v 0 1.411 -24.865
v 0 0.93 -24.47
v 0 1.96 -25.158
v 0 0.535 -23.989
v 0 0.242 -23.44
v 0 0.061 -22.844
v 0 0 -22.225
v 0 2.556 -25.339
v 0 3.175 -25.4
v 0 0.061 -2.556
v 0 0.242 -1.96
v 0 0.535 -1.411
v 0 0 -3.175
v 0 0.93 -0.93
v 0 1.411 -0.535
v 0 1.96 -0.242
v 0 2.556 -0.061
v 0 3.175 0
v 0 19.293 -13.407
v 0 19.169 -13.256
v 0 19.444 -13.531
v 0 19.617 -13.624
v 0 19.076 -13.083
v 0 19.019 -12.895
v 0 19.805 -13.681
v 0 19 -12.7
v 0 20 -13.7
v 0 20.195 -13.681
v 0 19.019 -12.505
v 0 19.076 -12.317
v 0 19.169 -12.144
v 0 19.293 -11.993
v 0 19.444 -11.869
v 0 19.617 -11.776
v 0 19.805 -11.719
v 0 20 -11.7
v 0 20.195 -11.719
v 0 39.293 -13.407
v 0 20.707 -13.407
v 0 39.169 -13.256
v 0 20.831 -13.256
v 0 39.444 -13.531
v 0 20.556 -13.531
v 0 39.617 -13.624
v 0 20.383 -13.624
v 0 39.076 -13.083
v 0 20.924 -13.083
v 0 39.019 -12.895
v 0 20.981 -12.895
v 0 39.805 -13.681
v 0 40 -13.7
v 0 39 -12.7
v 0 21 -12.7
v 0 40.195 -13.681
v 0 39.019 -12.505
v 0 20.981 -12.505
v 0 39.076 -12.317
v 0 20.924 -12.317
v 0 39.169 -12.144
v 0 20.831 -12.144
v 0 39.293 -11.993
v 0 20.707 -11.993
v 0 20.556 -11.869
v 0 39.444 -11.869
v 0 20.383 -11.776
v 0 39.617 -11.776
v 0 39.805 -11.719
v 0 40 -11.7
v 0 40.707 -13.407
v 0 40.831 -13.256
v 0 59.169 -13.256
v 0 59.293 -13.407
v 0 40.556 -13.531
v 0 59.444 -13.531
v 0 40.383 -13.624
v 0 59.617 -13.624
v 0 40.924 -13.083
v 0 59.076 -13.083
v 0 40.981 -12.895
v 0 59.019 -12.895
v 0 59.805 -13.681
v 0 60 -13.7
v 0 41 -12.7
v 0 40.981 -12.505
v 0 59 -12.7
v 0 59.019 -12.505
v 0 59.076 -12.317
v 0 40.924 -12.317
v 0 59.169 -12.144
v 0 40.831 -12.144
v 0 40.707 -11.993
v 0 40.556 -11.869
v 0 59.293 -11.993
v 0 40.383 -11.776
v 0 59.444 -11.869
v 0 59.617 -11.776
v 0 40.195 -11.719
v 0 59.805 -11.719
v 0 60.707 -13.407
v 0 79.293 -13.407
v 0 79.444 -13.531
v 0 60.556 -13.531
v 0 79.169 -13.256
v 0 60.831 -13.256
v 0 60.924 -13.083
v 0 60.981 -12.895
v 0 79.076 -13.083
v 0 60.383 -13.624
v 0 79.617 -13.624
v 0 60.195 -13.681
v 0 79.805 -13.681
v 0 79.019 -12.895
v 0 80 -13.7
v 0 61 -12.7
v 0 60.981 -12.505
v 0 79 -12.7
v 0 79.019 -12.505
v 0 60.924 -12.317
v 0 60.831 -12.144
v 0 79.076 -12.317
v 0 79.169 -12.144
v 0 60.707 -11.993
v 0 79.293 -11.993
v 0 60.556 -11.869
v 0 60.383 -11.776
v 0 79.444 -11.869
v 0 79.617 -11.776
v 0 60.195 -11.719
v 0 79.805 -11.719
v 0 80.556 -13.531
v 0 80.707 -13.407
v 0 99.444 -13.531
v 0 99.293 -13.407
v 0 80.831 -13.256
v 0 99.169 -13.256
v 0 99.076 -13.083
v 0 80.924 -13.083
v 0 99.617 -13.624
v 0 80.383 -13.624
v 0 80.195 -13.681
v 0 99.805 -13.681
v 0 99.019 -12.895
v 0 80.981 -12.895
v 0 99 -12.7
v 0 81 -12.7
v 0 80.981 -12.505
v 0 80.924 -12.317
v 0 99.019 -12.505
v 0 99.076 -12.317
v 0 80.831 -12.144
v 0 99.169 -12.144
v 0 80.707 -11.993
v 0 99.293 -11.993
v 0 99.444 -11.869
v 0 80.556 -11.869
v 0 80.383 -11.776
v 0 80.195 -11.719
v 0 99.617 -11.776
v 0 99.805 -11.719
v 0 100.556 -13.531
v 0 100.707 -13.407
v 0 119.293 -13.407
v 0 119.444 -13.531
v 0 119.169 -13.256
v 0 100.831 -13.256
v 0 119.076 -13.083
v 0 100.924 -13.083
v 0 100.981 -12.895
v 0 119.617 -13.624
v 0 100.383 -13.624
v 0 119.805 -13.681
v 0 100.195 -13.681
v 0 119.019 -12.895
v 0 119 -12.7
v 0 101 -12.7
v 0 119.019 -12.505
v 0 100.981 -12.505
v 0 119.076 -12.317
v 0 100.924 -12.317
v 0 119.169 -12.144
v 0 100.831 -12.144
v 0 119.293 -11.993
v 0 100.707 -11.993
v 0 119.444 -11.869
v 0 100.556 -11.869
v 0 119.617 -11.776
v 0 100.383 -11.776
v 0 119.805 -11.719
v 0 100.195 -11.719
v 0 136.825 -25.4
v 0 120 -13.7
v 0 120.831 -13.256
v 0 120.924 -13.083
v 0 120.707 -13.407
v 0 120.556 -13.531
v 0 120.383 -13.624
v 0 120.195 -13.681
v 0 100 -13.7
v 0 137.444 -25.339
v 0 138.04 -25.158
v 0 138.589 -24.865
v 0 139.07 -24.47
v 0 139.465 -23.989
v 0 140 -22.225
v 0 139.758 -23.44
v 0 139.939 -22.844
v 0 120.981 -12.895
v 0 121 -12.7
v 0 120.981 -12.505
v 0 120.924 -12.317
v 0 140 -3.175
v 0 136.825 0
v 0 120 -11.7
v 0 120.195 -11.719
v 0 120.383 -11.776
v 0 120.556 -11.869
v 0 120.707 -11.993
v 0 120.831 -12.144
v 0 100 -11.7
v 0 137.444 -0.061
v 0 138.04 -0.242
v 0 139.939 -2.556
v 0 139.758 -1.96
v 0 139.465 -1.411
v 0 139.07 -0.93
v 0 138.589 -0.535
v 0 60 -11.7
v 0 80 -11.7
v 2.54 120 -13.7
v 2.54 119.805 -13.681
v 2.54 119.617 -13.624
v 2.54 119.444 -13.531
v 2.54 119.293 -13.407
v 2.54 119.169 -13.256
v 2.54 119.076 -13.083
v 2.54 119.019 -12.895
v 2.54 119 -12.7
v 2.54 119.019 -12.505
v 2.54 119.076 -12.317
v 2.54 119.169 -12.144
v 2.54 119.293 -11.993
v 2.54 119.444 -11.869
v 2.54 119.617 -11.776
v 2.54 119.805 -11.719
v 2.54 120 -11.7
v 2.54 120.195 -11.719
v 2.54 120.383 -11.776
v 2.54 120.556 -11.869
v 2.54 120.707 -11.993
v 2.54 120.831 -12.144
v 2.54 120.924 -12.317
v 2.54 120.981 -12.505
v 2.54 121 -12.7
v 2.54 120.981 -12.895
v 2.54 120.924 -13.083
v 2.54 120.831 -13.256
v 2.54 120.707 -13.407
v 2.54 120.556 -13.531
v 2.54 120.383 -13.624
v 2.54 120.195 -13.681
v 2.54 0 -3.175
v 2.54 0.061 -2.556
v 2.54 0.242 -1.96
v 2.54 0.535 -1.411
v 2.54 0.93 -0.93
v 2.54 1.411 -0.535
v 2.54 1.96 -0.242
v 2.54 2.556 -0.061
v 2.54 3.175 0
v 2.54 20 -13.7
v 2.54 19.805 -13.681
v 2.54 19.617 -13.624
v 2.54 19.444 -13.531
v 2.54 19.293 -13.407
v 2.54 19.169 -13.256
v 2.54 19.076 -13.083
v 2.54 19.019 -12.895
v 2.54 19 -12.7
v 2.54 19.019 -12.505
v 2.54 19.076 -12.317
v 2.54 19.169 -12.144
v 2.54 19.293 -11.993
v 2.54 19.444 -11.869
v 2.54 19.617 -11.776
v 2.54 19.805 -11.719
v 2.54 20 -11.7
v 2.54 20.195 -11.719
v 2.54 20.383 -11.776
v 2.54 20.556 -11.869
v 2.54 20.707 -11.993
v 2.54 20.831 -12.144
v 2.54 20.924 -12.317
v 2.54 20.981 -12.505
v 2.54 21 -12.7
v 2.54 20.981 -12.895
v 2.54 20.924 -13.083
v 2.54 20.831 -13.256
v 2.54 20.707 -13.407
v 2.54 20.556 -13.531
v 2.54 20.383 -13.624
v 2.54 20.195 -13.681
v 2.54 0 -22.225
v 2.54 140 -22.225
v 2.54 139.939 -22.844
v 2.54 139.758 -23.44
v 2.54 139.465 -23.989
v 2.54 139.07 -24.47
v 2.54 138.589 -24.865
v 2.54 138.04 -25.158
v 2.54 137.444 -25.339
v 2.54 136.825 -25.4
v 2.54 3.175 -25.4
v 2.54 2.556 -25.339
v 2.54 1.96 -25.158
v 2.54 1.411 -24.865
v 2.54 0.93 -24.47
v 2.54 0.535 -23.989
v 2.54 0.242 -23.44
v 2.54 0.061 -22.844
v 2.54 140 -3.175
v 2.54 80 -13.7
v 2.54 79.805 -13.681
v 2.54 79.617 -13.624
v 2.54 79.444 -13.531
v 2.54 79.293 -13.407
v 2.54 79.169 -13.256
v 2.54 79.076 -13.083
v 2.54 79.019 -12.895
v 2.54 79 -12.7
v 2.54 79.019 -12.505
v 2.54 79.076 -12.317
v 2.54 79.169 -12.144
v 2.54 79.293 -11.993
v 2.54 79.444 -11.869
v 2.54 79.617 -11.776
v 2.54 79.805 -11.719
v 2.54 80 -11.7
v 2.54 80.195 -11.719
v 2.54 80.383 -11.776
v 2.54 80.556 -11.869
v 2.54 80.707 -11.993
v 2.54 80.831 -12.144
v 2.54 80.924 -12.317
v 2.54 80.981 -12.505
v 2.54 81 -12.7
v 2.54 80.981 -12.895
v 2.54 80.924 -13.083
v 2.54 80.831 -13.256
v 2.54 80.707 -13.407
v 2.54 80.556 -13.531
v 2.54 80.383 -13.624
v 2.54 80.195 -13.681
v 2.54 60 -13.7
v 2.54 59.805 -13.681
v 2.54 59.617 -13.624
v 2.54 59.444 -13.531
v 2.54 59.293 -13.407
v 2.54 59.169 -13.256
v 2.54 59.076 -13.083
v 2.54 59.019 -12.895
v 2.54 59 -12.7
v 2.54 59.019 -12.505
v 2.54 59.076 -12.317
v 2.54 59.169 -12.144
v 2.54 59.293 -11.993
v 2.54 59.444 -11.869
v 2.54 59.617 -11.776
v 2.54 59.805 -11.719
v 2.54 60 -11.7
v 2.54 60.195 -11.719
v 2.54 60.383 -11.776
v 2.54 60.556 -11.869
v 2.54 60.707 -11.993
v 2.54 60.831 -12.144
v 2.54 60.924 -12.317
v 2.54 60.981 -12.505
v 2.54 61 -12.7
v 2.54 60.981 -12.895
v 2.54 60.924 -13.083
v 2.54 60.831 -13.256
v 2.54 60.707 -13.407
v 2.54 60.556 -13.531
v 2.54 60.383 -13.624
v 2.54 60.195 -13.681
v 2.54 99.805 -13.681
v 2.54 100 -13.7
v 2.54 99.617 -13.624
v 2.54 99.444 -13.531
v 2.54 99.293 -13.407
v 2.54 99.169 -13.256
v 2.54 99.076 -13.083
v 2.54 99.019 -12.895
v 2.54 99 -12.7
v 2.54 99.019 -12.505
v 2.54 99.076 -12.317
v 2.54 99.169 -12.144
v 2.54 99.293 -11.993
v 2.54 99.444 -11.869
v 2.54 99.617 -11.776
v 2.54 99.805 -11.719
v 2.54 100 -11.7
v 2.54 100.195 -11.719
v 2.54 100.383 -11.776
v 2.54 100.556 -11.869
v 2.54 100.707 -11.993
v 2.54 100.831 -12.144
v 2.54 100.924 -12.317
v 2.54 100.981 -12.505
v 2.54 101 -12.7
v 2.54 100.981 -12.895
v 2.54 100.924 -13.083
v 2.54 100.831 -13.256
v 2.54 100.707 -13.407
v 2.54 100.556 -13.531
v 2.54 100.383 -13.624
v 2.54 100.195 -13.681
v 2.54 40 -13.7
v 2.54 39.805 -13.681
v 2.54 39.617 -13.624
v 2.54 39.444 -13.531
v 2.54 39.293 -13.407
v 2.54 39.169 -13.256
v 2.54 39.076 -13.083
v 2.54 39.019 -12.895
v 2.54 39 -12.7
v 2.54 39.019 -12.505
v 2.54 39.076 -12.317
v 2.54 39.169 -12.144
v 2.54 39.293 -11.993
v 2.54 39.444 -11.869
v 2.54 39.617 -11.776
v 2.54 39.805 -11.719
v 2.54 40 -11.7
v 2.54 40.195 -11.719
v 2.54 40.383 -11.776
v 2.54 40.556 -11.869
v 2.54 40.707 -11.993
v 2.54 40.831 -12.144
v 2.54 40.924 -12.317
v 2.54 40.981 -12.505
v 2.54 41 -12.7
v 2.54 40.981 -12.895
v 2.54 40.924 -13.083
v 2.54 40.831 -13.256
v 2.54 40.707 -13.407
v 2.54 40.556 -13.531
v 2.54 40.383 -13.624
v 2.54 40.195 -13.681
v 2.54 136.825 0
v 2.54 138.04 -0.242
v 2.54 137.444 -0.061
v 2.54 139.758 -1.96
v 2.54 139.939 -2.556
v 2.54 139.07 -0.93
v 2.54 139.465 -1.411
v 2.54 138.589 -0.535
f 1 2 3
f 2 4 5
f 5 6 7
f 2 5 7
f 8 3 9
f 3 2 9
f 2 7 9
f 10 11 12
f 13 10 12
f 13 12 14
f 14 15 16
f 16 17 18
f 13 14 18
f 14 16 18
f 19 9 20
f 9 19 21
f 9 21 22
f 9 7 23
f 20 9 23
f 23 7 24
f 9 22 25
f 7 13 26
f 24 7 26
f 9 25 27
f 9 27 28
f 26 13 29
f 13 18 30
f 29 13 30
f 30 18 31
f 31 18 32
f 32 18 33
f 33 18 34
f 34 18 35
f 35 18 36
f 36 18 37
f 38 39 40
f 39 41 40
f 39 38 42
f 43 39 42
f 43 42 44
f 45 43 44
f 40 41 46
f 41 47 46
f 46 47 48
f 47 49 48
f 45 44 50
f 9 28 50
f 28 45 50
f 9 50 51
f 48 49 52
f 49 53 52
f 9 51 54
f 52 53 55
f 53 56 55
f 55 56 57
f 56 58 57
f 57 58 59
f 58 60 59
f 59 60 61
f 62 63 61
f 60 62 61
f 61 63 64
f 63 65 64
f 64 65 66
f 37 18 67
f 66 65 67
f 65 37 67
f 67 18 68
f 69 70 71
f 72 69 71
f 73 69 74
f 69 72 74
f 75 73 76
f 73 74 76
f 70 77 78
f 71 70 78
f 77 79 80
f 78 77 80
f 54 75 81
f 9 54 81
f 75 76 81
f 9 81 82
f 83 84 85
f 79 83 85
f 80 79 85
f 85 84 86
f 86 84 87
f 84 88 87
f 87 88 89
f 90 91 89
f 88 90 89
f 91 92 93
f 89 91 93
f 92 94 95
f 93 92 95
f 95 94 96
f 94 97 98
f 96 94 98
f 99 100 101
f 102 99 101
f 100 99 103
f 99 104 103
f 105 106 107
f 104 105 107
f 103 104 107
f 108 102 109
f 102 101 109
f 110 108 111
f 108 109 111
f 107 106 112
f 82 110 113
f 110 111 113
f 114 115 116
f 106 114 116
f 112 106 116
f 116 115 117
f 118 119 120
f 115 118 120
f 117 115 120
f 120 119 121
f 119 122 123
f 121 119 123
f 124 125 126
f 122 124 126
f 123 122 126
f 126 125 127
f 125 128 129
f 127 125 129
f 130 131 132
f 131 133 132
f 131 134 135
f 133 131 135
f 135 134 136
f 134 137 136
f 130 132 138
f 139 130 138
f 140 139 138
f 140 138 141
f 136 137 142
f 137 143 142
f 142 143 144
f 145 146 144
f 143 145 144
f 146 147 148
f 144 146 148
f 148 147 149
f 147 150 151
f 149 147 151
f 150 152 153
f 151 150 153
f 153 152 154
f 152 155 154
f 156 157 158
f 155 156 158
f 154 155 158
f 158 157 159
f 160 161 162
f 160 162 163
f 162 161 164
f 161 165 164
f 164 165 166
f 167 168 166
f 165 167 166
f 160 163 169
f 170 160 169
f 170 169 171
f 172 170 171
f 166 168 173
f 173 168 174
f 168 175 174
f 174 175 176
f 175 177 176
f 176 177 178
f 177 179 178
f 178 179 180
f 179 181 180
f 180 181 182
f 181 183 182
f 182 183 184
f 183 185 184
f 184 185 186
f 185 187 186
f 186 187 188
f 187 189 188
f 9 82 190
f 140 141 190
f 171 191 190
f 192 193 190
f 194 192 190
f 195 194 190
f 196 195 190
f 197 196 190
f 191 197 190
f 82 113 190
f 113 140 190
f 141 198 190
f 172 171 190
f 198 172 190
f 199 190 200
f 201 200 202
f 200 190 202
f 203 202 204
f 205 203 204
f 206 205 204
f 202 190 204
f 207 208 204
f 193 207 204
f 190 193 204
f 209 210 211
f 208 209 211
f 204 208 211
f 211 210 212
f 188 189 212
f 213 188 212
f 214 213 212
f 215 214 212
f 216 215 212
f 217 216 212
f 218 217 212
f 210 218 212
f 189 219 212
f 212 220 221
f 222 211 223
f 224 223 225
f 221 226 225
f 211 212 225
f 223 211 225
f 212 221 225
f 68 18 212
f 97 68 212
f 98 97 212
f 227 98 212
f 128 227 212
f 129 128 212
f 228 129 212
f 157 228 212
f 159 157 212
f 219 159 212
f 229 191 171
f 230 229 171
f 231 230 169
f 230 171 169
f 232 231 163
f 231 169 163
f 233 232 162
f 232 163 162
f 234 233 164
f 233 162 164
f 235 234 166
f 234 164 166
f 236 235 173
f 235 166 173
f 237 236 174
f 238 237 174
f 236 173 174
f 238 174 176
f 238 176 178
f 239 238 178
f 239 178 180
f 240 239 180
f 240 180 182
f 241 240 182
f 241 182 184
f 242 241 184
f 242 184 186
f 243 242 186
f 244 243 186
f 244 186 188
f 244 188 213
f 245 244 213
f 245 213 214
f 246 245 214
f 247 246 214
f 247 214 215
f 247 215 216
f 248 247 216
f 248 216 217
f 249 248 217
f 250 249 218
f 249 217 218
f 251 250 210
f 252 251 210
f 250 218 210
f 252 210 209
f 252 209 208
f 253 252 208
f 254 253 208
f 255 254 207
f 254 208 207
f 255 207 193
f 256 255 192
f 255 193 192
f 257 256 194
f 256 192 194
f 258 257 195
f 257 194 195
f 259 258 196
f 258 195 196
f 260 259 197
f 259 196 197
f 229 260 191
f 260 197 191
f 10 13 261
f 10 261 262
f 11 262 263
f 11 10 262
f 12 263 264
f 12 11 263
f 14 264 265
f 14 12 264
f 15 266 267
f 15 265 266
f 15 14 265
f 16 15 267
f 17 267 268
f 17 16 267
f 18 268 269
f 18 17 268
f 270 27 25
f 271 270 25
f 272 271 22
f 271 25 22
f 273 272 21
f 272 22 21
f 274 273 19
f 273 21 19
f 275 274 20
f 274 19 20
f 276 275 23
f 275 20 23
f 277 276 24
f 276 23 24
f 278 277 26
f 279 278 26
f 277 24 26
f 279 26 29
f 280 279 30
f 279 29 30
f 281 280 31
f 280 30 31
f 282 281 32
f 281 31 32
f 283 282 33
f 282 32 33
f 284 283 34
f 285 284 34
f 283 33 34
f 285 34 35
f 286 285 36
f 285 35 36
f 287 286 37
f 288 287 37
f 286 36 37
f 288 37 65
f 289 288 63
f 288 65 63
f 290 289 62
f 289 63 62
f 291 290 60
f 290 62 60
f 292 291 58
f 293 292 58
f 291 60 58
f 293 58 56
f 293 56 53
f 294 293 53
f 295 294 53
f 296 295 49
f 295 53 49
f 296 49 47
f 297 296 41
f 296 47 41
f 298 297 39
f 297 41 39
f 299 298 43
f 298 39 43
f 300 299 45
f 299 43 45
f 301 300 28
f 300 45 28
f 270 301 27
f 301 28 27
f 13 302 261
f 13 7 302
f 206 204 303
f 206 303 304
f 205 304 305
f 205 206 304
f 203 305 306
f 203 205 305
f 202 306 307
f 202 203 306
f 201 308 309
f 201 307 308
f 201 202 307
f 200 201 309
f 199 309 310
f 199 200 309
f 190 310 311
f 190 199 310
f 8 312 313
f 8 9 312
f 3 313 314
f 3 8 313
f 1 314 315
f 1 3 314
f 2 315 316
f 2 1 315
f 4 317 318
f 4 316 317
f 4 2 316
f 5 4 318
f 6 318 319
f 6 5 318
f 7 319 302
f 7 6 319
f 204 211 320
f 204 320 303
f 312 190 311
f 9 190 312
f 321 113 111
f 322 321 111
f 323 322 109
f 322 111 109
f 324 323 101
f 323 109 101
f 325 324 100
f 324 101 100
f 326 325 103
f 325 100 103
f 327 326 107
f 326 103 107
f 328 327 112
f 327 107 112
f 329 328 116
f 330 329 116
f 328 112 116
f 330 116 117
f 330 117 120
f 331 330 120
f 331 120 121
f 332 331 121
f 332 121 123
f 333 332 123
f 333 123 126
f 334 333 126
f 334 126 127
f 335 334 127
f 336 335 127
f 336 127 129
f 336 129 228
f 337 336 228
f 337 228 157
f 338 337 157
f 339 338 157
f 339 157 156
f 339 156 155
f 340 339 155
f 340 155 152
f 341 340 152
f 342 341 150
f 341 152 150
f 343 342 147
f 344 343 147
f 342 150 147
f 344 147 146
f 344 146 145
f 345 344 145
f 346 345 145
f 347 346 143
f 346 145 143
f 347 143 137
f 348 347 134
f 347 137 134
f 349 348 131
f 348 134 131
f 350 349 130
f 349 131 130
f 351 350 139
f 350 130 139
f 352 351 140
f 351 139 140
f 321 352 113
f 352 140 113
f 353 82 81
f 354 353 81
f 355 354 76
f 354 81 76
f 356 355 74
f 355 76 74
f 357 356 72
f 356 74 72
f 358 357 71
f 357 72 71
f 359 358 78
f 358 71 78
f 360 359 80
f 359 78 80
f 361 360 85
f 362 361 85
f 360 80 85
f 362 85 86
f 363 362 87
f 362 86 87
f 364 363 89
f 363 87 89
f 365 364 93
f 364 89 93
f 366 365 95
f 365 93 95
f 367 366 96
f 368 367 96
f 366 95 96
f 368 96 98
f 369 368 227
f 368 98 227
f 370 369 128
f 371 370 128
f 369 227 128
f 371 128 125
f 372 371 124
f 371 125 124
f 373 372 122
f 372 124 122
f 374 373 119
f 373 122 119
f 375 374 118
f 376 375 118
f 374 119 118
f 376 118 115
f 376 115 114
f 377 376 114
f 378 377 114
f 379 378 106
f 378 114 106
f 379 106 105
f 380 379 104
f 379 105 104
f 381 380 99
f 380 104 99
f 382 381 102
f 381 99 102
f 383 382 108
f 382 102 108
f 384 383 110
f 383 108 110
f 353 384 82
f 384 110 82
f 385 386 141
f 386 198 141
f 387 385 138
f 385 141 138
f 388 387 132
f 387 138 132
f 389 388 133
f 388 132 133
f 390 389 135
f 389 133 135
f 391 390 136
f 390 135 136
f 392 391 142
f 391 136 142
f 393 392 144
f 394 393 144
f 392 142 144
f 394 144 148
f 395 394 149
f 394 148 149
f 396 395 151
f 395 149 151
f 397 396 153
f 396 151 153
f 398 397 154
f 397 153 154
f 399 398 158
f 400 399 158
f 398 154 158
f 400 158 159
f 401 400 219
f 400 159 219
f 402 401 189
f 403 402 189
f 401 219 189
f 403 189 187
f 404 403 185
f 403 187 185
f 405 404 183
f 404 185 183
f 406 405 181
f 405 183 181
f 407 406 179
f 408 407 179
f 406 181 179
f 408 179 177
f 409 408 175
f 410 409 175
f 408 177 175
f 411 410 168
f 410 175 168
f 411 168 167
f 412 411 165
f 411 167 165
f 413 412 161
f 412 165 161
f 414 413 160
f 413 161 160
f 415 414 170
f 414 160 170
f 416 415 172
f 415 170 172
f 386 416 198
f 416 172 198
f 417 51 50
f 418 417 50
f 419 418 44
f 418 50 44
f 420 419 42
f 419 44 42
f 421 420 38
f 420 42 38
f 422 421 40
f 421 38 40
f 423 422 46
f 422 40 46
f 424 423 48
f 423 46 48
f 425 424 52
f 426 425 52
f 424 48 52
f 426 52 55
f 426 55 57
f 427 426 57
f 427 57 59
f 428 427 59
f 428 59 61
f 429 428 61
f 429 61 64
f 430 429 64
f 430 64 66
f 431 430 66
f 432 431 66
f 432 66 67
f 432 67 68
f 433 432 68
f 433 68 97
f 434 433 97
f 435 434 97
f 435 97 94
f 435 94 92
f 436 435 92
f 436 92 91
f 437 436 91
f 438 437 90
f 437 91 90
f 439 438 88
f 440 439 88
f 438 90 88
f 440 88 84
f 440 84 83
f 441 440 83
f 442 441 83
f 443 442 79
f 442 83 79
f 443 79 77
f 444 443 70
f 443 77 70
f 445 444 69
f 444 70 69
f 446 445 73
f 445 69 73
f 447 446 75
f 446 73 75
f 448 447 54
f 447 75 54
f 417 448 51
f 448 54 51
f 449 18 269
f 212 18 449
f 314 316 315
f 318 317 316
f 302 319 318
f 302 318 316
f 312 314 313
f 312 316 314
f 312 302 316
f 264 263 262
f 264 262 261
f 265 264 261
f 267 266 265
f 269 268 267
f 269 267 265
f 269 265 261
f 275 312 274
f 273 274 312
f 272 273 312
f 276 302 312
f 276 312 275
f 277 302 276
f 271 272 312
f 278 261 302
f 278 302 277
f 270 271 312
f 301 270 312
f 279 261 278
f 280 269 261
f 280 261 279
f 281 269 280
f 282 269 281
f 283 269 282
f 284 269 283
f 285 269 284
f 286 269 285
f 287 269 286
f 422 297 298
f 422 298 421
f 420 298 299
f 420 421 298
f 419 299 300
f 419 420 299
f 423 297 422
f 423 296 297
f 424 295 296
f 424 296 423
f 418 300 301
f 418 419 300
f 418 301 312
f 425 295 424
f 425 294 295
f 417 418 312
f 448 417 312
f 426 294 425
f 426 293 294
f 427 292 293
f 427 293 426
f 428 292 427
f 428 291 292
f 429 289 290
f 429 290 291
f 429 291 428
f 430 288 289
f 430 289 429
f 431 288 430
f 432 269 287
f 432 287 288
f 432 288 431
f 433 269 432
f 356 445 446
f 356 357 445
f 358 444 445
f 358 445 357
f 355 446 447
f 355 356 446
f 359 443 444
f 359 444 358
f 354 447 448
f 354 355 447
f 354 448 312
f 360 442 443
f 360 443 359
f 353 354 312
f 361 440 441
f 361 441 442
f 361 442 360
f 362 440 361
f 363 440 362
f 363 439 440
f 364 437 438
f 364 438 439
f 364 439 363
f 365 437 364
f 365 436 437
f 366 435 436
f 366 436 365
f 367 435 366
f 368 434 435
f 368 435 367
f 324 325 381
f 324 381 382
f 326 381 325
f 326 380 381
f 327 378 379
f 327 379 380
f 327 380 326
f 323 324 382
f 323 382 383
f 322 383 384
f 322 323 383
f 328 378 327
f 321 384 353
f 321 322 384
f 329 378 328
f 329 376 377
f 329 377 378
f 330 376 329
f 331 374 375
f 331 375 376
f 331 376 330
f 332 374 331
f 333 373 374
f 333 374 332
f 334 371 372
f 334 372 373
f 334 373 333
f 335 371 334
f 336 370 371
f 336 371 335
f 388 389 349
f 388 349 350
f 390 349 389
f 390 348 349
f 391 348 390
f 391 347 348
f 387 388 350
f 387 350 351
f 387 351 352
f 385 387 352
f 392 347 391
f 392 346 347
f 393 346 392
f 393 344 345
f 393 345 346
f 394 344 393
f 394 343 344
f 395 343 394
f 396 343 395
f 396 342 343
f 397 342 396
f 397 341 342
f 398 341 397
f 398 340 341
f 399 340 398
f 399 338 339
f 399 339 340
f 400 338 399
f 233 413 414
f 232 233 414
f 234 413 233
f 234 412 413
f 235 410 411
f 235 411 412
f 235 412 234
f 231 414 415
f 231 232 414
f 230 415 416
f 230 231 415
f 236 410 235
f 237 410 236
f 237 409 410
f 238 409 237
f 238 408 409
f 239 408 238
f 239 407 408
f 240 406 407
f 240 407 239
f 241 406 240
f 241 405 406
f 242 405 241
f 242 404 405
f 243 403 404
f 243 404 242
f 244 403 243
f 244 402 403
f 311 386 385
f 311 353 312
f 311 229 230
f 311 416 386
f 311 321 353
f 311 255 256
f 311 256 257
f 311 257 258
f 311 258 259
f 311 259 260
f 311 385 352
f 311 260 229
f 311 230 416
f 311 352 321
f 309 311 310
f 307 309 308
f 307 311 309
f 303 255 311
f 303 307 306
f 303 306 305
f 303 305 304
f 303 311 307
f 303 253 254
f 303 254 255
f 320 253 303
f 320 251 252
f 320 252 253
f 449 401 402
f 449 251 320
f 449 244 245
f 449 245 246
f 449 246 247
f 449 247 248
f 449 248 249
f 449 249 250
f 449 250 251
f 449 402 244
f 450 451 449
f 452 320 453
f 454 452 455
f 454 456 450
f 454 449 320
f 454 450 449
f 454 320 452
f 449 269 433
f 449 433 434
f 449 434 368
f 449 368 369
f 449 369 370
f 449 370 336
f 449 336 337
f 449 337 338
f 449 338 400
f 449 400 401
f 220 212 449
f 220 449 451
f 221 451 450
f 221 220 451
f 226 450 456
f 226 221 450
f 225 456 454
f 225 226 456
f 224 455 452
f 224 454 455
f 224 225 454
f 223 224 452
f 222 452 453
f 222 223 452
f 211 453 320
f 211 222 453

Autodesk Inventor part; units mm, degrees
ref_plane "YZ Plane" through (0, 0, 0) normal (1, 0, 0) x (0, 1, 0)
ref_plane "XZ Plane" through (0, 0, 0) normal (0, 1, 0) x (-1, 0, 0)
ref_plane "XY Plane" through (0, 0, 0) normal (0, 0, 1) x (1, 0, 0)
sketch "Sketch1" plane through (0, 0, 0) normal (1, 0, 0) x (0, 1, 0)
  line L0 (3.175, 0) -> (136.825, 0)
  line L1 (140, -3.175) -> (140, -22.225)
  line L2 (136.825, -25.4) -> (3.175, -25.4)
  line L3 (0, -22.225) -> (0, -3.175)
  arc A0 (140, -3.175) -> (136.825, 0) centre (136.825, -3.175) ccw
  arc A1 (136.825, -25.4) -> (140, -22.225) centre (136.825, -22.225) ccw
  arc A2 (0, -22.225) -> (3.175, -25.4) centre (3.175, -22.225) ccw
  arc A3 (3.175, 0) -> (0, -3.175) centre (3.175, -3.175) ccw
  point P0 (0, 0)
  point P1 (140, 0)
  point P2 (0, -25.4)
  dimension "d0" = 25.4
  dimension "d1" = 140
  dimension "d2" = 3.175
extrude "Extrusion1" add sketch "Sketch1" along normal blind 2.54
sketch "Sketch3" plane through (2.54, 0, 0) normal (1, 0, 0) x (0, 0, -1)
  line L0 (22.225, 140) -> (3.175, 140) projected
  line L1 (0, 136.825) -> (0, 3.175) projected
  circle A0 centre (12.7, 120) radius 1.9226
  circle A1 centre (12.7, 100) radius 1.9226
  circle A2 centre (12.7, 80) radius 1.9226
  circle A3 centre (12.7, 60) radius 1.9226
  circle A4 centre (12.7, 40) radius 1.9226
  circle A5 centre (12.7, 20) radius 1.9226
  point P0 (0, 0)
  dimension "d29" = 20
  dimension "d32" = 20
hole "Hole2" at (2.54, 40, -12.7) at (2.54, 20, -12.7) at (2.54, 60, -12.7) at (2.54, 80, -12.7) at (2.54, 100, -12.7) at (2.54, 120, -12.7) direction (-1, 0, 0) diameter 2 depth 25.4 tip angle 118
properties part number "joinerBracket" material "Steel"
